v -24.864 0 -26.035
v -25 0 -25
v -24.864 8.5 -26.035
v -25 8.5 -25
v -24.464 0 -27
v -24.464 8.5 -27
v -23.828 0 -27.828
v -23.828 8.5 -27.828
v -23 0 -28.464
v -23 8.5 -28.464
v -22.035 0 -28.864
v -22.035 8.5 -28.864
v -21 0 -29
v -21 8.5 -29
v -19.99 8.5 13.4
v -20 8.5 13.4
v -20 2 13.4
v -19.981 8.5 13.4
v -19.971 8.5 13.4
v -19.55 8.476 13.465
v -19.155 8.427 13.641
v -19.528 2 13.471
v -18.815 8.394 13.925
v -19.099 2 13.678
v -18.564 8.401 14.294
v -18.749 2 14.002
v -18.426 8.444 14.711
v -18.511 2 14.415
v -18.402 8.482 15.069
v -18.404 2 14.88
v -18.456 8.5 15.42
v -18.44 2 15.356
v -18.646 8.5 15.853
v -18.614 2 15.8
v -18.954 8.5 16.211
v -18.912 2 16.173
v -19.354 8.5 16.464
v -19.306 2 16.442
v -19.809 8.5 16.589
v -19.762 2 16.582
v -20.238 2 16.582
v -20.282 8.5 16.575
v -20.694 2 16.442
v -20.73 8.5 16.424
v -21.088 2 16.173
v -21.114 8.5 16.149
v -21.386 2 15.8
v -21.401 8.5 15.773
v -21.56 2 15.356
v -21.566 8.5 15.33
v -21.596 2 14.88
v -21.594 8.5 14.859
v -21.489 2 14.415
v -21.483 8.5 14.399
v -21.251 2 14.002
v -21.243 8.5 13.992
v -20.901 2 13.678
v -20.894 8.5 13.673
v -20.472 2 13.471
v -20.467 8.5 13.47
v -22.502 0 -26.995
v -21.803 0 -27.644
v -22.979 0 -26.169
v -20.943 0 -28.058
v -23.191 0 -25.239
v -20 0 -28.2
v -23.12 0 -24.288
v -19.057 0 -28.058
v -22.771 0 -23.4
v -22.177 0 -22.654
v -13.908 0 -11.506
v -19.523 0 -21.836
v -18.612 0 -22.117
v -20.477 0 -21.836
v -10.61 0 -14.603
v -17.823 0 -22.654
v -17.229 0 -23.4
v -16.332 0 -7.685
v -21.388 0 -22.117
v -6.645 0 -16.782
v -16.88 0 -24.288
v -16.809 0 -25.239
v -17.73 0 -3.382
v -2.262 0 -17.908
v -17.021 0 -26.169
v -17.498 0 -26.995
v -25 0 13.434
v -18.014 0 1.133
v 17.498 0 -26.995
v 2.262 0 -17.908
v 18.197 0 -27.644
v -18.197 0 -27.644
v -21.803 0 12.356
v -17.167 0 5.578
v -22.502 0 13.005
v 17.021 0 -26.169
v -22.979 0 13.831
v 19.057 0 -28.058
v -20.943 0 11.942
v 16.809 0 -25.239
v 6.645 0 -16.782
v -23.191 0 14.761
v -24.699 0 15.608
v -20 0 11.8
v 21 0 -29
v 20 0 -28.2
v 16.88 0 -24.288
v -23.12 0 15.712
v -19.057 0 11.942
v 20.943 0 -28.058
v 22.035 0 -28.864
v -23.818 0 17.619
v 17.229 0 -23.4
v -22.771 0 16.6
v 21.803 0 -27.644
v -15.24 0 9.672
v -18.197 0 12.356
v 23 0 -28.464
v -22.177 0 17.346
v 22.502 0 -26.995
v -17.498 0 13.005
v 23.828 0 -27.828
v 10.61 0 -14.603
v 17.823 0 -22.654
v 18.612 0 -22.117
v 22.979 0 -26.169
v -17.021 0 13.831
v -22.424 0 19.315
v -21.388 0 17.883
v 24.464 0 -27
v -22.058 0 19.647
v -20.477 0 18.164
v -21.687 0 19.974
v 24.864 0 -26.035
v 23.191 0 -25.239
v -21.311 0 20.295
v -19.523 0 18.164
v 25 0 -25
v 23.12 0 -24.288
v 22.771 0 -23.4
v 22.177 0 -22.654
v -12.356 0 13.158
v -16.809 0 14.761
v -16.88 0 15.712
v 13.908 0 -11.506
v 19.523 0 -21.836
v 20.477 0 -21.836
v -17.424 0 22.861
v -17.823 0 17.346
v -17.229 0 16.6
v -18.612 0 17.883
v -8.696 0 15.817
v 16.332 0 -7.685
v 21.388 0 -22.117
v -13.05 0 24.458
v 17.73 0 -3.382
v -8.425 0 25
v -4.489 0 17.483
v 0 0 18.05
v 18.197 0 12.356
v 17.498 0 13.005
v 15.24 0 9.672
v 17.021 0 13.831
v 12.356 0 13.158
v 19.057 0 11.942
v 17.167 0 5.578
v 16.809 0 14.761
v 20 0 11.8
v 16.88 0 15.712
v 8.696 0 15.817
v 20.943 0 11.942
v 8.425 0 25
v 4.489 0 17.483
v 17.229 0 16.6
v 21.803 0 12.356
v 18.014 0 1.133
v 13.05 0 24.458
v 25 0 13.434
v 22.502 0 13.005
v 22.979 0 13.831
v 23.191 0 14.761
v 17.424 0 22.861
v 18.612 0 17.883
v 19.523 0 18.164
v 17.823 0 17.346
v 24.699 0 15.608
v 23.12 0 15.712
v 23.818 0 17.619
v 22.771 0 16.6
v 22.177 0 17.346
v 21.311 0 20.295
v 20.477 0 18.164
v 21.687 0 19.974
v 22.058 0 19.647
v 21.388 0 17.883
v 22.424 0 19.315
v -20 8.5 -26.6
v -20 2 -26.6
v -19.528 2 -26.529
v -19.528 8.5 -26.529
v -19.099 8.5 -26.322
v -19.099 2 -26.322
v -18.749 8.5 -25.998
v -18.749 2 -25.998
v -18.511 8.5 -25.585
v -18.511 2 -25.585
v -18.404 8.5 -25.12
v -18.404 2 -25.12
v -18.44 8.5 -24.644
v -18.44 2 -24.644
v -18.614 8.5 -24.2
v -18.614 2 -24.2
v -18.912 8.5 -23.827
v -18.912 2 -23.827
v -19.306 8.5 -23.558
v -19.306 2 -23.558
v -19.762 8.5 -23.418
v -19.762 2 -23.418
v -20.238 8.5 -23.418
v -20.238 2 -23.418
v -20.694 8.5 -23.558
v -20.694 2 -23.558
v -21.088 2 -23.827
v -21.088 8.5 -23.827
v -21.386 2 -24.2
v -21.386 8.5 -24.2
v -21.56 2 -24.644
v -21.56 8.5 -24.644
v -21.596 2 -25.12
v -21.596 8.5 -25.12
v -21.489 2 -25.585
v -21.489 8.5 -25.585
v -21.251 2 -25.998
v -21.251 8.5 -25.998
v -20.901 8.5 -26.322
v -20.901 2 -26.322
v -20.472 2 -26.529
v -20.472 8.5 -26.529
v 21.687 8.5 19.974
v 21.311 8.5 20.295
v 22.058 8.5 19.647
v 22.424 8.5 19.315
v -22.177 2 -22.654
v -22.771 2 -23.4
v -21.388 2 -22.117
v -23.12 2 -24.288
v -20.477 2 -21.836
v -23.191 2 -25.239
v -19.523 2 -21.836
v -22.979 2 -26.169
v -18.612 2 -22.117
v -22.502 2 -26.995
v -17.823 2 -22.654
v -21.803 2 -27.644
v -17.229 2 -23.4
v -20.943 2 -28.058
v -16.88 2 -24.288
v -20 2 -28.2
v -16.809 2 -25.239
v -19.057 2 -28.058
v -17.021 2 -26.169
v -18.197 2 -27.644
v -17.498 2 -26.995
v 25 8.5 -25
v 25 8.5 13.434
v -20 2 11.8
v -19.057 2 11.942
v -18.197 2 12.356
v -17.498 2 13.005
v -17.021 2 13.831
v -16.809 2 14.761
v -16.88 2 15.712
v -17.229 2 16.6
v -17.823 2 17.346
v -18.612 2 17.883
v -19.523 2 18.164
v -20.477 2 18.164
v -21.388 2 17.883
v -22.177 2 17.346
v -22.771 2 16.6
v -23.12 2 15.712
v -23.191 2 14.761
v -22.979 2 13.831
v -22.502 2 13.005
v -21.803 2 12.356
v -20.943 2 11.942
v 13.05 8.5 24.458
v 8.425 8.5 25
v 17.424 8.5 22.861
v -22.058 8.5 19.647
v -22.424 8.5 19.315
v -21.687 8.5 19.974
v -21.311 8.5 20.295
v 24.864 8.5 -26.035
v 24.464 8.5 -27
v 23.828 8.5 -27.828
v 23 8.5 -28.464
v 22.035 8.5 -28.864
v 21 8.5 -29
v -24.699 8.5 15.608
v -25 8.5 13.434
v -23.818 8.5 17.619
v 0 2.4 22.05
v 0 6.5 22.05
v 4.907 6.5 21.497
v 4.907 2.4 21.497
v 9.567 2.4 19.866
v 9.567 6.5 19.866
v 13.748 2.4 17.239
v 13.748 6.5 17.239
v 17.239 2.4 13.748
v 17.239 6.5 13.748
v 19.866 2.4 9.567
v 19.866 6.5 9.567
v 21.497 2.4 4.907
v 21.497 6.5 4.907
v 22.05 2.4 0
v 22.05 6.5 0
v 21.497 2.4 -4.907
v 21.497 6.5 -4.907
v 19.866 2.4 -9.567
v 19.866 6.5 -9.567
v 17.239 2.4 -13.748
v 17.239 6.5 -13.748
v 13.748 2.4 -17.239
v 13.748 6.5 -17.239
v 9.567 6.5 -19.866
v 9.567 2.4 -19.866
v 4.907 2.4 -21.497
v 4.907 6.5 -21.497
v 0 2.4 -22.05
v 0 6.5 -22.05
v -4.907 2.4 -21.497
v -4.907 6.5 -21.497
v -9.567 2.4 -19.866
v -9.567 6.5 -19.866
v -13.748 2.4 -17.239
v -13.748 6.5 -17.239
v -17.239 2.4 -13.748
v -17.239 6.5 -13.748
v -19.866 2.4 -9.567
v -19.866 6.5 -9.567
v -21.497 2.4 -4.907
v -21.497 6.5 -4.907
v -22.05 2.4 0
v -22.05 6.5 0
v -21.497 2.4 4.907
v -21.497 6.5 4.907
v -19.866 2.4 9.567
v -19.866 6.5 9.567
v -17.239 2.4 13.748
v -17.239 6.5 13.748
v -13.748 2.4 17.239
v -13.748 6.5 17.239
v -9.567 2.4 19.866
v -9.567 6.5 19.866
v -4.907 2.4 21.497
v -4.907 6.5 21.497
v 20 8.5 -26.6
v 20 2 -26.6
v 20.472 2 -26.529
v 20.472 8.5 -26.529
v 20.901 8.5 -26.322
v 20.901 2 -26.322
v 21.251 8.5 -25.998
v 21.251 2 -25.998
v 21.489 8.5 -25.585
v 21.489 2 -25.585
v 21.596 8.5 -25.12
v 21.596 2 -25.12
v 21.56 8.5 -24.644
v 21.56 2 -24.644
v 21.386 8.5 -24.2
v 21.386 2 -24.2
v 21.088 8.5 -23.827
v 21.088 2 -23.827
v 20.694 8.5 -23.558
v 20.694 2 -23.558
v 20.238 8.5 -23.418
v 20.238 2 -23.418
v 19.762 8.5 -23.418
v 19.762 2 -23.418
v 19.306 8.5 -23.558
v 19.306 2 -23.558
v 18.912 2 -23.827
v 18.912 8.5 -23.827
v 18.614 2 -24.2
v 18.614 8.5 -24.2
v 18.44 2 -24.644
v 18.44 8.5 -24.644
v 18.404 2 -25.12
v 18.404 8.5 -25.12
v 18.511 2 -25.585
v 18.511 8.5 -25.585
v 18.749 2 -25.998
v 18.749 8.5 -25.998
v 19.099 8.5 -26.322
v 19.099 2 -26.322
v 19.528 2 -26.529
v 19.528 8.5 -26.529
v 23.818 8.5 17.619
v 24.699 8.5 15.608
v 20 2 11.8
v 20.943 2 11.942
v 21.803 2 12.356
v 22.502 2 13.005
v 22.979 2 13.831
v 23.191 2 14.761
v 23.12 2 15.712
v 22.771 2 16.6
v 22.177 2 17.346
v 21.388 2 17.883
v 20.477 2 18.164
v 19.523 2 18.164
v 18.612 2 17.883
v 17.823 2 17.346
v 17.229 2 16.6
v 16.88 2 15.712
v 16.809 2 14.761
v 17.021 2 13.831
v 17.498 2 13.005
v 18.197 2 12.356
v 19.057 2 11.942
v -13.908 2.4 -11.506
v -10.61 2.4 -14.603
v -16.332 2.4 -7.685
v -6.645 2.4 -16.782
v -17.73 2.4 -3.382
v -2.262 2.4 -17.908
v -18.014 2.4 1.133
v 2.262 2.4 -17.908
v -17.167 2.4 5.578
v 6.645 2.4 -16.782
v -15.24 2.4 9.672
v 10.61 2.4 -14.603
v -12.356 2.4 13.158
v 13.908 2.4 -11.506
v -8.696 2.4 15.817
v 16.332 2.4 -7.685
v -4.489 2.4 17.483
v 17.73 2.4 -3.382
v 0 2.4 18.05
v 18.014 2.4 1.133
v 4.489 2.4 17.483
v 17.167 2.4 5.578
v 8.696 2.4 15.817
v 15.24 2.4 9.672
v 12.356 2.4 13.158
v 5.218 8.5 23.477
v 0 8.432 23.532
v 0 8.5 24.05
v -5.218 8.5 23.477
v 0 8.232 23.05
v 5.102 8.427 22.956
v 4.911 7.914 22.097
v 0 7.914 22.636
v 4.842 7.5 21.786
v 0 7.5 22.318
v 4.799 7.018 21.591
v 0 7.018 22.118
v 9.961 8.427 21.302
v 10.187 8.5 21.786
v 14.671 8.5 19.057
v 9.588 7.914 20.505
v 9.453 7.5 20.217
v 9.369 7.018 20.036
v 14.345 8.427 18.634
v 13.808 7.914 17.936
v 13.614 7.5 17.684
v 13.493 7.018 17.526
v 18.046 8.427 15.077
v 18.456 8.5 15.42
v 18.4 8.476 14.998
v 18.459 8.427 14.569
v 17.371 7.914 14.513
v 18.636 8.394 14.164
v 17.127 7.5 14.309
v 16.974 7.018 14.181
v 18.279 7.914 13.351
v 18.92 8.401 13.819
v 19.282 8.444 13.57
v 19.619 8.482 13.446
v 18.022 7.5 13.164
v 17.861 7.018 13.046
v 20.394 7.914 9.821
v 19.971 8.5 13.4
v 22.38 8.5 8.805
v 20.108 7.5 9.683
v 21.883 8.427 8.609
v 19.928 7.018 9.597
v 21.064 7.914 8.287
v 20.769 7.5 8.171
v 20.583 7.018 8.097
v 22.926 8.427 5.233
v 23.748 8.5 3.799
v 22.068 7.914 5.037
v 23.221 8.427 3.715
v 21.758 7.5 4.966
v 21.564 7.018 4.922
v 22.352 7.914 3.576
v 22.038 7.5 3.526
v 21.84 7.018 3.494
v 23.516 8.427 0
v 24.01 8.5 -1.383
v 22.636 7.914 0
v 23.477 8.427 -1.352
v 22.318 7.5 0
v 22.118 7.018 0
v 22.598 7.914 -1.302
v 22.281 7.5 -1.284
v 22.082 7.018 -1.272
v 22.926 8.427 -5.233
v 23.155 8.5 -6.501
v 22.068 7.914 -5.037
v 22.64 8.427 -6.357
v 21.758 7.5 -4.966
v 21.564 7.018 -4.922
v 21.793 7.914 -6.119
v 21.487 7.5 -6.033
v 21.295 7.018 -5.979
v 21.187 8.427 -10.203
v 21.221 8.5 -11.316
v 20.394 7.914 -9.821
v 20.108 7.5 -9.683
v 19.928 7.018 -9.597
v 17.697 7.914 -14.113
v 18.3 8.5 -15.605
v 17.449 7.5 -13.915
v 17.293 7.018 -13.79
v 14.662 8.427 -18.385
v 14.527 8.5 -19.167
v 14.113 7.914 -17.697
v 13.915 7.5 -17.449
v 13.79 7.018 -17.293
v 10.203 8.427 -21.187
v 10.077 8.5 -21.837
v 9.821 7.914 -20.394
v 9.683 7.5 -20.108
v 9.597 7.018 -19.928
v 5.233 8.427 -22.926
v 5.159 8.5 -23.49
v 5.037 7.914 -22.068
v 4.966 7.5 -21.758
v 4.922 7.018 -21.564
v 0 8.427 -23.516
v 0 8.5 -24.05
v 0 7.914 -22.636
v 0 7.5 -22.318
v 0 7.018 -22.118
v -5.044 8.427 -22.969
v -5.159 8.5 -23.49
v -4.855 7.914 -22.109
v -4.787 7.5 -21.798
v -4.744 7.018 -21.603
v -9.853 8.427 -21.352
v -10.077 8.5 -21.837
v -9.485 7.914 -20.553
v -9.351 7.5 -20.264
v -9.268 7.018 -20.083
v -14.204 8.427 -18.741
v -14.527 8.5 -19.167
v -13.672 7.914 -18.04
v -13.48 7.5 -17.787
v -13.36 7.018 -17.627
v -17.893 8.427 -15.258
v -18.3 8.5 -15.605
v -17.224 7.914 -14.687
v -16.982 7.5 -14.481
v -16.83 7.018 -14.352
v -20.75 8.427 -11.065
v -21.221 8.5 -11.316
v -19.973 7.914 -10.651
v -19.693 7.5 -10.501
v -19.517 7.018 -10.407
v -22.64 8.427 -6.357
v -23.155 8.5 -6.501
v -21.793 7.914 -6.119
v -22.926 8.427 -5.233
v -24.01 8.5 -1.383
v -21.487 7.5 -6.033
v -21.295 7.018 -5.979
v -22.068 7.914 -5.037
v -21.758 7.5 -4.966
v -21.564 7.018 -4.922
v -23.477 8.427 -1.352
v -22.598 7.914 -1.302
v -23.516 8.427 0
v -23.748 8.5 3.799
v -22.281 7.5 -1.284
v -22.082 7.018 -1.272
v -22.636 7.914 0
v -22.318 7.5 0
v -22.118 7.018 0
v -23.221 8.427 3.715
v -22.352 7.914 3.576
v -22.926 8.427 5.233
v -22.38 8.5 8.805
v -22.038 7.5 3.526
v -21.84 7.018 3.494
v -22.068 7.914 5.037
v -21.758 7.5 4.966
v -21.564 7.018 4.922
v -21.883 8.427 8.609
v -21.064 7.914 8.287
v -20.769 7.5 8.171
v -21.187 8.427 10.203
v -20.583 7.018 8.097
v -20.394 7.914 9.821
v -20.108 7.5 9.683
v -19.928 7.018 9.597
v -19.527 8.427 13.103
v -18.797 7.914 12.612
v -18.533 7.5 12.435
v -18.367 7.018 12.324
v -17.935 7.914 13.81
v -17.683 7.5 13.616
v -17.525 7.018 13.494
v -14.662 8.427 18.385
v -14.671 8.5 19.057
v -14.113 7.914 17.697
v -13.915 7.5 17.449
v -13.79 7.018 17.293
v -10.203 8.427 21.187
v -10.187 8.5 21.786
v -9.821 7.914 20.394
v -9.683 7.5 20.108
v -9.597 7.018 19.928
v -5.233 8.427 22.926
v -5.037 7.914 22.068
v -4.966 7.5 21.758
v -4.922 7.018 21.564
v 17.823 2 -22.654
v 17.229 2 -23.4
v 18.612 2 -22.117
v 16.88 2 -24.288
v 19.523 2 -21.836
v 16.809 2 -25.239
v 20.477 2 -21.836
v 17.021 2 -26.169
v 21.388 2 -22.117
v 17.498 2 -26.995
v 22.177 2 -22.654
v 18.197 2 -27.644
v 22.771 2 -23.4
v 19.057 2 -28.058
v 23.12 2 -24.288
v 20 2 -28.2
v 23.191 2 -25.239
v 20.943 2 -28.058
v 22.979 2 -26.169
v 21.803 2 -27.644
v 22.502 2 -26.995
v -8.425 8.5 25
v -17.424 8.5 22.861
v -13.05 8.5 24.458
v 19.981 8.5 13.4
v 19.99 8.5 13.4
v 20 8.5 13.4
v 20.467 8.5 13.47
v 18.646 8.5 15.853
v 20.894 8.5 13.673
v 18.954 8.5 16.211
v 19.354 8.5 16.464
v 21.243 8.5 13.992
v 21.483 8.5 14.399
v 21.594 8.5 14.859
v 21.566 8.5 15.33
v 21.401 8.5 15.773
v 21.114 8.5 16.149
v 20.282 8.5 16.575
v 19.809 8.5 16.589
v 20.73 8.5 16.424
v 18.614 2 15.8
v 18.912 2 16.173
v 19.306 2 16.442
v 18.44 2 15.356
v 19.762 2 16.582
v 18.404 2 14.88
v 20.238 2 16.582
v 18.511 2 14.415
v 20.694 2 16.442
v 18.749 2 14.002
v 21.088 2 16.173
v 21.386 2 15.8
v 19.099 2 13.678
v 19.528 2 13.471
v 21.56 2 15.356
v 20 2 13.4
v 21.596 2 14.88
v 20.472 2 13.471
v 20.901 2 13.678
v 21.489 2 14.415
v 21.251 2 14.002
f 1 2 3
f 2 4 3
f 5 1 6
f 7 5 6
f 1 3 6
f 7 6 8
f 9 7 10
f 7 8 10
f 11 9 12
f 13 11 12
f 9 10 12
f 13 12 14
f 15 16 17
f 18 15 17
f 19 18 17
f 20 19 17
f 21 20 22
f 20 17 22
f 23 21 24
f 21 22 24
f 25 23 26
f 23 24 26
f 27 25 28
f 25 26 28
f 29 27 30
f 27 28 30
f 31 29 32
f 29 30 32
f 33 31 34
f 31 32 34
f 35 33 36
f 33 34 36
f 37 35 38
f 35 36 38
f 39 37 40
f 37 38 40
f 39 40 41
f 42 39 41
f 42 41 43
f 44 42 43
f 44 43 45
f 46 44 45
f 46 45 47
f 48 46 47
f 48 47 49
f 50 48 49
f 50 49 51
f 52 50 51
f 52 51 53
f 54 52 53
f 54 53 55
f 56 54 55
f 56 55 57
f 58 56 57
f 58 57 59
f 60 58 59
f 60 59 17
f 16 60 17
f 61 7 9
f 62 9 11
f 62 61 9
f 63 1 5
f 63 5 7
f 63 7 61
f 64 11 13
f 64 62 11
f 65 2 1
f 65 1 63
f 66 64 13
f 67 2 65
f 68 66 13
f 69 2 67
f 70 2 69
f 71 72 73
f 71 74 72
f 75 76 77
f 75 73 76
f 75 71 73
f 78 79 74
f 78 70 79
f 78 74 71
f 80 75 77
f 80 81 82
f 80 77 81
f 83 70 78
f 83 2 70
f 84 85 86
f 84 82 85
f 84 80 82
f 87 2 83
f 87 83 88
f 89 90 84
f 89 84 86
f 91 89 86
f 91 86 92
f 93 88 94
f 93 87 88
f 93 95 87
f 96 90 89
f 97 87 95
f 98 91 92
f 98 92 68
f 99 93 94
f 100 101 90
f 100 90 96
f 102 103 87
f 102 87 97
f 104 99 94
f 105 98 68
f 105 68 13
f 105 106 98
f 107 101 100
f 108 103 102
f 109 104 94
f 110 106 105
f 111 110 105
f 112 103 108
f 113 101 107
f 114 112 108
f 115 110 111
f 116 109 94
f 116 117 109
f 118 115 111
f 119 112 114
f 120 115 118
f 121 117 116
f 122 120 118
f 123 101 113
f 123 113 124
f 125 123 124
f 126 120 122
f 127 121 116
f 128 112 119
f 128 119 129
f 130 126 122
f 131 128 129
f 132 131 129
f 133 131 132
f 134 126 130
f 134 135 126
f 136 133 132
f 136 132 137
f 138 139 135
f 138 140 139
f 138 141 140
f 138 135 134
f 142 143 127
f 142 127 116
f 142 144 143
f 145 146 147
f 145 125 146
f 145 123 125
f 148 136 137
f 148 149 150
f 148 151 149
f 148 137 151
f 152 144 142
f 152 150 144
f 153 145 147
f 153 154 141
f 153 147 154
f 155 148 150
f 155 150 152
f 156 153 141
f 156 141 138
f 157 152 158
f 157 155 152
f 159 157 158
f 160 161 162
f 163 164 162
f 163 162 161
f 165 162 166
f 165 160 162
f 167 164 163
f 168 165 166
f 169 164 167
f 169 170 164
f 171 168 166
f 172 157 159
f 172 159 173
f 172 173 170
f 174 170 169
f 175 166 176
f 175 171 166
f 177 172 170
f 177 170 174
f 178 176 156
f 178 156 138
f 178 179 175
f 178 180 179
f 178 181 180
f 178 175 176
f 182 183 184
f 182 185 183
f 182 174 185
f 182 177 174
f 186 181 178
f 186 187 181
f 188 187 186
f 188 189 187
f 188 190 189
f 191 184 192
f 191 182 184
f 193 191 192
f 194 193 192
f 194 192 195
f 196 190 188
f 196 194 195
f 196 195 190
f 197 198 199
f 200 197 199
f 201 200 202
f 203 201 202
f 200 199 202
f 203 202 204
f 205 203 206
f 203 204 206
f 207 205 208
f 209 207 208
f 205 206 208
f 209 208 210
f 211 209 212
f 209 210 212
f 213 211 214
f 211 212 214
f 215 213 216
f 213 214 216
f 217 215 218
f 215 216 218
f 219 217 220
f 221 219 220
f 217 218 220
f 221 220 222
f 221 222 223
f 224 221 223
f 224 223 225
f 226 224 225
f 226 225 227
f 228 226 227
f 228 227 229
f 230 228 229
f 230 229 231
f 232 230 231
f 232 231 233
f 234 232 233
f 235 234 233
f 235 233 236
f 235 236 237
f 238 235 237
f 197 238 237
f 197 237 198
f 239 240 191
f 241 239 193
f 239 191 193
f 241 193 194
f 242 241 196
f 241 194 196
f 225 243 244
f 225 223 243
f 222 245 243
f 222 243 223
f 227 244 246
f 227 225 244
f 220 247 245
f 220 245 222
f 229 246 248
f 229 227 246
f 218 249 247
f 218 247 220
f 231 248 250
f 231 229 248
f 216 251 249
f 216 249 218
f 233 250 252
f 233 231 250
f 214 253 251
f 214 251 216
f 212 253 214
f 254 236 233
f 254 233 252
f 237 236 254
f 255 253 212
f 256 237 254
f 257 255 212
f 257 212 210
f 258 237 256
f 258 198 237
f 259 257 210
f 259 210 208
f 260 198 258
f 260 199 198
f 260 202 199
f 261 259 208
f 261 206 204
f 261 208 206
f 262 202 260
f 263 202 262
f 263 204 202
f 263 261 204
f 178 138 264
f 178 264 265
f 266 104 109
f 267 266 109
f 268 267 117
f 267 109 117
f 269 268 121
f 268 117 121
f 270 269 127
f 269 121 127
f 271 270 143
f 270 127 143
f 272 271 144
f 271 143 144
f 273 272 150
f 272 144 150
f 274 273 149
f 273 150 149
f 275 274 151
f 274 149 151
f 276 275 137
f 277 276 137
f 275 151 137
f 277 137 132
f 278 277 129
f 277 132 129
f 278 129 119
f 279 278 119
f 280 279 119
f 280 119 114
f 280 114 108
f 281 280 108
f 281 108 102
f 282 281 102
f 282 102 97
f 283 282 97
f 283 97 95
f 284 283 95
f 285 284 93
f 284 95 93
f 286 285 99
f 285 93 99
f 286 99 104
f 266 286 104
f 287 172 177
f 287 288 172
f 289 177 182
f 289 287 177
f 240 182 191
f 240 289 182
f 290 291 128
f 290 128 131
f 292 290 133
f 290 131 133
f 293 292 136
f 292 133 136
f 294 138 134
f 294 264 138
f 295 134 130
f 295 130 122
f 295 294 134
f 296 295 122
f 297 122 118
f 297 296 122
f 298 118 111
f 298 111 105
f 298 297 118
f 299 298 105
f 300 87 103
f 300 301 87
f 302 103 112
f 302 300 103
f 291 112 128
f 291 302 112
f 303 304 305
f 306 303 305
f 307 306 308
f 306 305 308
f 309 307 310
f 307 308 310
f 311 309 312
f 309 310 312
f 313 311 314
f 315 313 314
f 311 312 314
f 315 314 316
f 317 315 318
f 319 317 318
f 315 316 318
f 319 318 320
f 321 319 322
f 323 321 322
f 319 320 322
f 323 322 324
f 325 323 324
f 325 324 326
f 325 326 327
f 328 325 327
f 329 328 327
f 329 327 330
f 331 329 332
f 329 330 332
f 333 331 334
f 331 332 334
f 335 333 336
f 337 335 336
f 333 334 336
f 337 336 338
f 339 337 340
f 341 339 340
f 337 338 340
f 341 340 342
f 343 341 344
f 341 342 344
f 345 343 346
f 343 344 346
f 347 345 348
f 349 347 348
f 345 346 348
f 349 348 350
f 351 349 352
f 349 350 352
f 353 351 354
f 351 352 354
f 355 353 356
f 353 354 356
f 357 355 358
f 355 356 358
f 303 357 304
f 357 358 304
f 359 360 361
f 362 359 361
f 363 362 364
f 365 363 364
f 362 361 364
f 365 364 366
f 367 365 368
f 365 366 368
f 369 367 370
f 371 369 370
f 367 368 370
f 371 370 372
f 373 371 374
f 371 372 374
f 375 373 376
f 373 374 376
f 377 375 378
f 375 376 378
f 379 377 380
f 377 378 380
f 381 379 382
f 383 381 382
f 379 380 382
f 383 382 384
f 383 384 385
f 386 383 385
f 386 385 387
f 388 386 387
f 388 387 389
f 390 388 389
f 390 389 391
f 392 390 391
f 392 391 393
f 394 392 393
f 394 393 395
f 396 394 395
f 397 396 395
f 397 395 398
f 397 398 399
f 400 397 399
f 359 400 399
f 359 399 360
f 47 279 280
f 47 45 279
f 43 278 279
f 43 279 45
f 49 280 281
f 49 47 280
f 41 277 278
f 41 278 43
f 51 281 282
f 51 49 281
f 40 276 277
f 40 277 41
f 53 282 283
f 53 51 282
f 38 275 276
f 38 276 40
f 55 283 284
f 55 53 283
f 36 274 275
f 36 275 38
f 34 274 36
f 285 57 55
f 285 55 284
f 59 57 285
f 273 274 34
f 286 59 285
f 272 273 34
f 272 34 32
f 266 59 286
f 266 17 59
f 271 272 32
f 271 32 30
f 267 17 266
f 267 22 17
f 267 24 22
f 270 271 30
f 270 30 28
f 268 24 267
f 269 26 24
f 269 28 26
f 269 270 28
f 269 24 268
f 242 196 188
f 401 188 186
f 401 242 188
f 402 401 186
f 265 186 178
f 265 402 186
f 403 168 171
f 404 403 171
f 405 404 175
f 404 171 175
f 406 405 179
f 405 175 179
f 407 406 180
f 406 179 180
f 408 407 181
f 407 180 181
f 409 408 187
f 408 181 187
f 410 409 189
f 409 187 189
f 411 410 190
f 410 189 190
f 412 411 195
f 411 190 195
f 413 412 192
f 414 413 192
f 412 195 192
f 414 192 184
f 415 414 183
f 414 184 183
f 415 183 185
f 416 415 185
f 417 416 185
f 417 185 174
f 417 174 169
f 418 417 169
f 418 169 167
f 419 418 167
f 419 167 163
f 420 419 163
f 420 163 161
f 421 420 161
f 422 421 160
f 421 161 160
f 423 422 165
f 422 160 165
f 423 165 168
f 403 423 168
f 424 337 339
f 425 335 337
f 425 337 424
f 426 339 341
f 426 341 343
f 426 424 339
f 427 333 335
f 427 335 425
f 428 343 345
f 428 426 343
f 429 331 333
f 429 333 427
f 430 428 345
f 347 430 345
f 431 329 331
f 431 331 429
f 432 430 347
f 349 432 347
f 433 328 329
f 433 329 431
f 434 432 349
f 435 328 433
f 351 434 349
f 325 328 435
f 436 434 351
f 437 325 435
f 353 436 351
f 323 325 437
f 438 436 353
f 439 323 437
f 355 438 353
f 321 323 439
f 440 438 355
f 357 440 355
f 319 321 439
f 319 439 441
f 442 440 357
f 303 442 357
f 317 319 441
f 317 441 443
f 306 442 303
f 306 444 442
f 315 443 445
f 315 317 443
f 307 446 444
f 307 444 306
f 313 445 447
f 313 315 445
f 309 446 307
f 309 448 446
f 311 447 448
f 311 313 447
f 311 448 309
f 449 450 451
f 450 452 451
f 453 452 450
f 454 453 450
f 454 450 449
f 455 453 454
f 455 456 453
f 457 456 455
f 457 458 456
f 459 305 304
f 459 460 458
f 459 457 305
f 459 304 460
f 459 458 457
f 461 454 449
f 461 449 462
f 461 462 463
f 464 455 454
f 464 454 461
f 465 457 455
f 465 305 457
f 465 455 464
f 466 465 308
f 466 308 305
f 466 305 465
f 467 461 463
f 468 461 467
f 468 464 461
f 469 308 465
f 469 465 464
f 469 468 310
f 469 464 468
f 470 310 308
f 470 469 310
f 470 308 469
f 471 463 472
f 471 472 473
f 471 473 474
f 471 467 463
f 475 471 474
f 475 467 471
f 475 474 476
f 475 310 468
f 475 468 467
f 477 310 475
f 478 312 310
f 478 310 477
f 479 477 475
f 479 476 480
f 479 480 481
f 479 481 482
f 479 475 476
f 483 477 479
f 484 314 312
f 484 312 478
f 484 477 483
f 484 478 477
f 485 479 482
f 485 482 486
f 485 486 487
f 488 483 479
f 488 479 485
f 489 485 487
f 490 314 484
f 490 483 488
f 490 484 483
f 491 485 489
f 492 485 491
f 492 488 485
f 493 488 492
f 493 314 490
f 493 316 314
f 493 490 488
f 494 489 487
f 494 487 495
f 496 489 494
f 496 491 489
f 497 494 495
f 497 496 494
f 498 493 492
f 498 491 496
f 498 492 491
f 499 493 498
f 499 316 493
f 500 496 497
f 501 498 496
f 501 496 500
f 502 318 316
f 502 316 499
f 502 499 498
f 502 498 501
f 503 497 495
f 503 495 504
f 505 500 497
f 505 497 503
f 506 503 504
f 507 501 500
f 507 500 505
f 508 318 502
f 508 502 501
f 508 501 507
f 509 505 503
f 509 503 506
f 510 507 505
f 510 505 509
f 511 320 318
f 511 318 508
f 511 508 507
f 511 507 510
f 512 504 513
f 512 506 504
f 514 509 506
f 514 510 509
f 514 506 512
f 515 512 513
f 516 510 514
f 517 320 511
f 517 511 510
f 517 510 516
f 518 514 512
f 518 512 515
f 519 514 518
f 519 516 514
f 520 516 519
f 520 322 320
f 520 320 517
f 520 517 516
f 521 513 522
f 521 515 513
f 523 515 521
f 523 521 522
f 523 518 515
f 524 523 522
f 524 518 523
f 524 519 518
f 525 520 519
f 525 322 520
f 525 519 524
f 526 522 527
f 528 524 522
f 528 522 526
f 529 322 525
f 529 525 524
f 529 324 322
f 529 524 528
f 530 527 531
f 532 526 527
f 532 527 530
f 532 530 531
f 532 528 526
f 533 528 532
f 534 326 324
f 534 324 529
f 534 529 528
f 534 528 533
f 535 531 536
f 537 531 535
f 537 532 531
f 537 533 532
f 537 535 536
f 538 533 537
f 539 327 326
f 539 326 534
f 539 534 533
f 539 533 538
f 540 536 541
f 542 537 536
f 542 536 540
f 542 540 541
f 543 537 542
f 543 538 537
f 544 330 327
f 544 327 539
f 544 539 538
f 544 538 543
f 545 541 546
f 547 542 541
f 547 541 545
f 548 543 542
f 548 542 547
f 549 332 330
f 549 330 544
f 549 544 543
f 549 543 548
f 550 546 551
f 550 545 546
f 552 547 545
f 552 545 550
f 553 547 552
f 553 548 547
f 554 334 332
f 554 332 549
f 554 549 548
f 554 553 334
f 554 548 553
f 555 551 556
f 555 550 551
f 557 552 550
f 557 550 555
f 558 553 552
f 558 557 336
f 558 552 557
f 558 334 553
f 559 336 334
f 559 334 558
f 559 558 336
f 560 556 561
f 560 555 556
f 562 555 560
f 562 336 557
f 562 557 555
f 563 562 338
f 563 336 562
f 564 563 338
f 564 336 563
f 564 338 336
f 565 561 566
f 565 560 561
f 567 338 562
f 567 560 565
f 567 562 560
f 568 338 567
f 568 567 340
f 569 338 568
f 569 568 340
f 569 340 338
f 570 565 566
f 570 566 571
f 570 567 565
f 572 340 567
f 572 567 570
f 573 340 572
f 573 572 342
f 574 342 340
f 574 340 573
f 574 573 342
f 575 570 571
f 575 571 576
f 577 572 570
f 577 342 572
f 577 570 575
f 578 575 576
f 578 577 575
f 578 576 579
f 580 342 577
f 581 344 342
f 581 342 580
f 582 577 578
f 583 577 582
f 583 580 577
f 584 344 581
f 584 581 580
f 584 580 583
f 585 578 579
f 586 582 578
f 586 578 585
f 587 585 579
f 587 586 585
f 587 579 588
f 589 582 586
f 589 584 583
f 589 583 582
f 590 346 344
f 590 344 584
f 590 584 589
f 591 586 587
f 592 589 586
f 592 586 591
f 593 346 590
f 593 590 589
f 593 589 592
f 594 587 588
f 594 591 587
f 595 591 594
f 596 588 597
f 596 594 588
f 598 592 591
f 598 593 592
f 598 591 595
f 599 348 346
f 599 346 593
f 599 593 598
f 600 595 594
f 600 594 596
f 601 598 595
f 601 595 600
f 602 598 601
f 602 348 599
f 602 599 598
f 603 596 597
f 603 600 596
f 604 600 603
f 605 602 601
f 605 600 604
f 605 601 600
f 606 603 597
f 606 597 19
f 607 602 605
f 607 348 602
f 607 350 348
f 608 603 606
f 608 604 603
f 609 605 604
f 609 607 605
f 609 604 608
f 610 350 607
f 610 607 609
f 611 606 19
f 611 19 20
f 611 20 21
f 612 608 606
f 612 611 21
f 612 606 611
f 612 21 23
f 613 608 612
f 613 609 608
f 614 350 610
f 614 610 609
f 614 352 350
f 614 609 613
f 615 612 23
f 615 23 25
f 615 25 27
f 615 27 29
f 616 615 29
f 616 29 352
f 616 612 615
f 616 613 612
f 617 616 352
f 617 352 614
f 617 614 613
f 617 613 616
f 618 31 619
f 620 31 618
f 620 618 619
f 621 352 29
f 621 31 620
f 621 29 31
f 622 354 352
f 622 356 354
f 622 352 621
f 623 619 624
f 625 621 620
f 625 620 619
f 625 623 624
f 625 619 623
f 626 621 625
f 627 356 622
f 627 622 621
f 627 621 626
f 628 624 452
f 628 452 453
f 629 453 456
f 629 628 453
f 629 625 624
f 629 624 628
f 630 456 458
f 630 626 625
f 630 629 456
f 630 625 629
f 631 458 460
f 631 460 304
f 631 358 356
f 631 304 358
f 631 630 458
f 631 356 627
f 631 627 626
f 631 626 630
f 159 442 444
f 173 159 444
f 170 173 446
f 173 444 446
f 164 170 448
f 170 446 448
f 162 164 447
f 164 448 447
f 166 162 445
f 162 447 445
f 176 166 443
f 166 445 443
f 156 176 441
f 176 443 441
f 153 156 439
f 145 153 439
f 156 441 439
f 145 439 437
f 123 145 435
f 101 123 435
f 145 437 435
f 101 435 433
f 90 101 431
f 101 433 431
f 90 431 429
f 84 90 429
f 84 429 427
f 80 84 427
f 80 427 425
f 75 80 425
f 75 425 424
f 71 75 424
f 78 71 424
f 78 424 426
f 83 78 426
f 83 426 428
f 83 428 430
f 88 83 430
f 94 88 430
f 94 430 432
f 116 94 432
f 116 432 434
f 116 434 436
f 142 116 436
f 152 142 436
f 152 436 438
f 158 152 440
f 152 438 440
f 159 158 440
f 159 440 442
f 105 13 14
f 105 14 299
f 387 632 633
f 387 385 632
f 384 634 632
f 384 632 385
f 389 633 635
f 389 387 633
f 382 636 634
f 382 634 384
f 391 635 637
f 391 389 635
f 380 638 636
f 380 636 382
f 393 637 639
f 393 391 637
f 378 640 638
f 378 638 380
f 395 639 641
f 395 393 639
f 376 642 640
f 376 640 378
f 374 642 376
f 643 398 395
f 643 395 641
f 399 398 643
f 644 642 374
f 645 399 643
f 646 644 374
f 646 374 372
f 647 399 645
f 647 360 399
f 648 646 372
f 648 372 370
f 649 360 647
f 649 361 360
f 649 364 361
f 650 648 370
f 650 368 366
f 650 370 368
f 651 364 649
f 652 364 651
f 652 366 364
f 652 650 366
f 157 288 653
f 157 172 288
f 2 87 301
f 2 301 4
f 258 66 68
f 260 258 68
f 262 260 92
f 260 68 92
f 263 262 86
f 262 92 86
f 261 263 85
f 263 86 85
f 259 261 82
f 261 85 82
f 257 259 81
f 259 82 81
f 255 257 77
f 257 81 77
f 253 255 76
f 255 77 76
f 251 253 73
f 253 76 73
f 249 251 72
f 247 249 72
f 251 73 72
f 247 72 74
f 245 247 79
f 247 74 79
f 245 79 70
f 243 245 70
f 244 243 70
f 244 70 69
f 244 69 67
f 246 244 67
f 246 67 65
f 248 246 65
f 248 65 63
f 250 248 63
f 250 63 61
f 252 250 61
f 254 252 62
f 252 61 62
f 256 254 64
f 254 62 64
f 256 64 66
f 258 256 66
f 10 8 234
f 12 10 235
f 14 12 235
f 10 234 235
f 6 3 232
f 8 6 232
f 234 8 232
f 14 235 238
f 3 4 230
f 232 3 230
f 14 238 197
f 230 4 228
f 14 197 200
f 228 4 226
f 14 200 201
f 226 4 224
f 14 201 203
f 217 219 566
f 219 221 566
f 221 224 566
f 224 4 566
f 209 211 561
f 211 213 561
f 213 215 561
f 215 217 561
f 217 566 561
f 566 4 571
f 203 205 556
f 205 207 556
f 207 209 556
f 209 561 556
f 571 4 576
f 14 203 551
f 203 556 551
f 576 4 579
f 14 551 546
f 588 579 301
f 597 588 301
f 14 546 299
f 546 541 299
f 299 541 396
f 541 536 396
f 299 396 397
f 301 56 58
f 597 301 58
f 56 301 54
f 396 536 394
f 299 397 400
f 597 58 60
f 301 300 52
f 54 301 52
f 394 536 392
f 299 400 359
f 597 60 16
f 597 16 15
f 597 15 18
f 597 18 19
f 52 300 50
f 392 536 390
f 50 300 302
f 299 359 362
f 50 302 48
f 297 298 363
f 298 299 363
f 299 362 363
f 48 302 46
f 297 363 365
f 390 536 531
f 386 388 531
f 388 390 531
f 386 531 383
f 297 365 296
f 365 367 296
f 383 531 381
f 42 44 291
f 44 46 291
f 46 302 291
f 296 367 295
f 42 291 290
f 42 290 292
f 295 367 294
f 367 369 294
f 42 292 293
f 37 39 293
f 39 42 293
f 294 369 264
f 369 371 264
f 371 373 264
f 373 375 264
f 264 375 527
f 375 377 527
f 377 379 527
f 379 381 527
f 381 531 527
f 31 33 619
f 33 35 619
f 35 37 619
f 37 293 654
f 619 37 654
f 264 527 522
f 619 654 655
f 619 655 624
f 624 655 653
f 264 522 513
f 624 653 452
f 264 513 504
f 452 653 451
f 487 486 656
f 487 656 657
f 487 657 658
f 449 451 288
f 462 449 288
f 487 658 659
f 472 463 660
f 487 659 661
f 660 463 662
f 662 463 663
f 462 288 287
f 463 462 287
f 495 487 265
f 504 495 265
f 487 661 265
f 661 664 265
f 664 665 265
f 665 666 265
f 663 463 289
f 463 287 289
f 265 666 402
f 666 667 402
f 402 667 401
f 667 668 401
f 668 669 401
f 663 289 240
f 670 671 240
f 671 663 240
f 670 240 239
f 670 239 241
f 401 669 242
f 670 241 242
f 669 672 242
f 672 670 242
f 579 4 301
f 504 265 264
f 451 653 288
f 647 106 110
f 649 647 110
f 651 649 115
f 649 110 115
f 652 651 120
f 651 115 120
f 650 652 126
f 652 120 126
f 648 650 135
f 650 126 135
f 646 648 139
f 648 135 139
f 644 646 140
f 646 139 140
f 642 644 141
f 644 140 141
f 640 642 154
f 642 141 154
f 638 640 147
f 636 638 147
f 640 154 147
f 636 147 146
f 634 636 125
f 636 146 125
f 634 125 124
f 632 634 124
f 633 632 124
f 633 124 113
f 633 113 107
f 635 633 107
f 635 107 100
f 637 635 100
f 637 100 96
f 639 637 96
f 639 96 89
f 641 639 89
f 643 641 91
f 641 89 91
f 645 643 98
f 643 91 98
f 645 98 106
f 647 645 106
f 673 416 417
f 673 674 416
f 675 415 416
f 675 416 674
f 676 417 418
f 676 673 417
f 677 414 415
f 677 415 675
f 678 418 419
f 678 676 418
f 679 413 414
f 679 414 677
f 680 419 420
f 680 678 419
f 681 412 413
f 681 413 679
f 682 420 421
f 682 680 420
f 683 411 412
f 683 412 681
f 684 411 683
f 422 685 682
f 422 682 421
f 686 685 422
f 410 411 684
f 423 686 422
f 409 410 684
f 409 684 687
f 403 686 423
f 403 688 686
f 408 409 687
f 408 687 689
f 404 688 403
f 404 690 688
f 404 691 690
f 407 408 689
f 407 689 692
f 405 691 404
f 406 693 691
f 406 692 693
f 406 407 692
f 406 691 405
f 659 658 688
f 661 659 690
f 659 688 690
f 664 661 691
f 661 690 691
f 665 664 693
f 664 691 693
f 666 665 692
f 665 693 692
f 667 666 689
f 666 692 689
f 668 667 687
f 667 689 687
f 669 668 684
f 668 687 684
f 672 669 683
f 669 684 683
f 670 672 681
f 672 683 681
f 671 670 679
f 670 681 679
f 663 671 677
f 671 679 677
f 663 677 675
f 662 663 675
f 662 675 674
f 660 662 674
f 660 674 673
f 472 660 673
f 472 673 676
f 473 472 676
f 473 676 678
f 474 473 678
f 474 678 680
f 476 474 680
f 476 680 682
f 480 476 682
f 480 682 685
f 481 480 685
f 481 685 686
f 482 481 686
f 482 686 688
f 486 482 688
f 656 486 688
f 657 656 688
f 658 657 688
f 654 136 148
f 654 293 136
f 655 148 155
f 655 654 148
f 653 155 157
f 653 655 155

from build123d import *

# Parameters (mm, degrees)
SKETCH_1_R          = 25
EXTRUDE_1_DEPTH     = 8.5
SKETCH_2_R          = 22.05
CUT_EXTRUDE_1_DEPTH = 6.1
SKETCH_3_R          = 18.05
CUT_EXTRUDE_2_DEPTH = 12.5
FILLET_2_R          = 2
EXTRUDE_3_DEPTH     = 8.5
SKETCH_8_R          = 3.2
SKETCH_8_R_2        = 1.6
CUT_EXTRUDE_3_DEPTH = 2
SKETCH_8_2_R        = 1.6
CUT_EXTRUDE_4_DEPTH = 10
FILLET_3_R          = 4
CUT_EXTRUDE_5_DEPTH = 10
FILLET_5_R          = 8
FILLET_6_R          = 20


with BuildPart() as part:
    # 草图1 → 凸台-拉伸1 (new body)
    with BuildSketch(Plane(origin=(0, 0, 0), x_dir=(1, 0, 0), z_dir=(0, 1, 0))):
        Circle(SKETCH_1_R)
    extrude(amount=EXTRUDE_1_DEPTH)

    # 草图2 → 切除-拉伸1 (cut)
    with BuildSketch(Plane(origin=(0, 8.5, 0), x_dir=(1, 0, 0), z_dir=(0, 1, 0))):
        Circle(SKETCH_2_R)
    extrude(amount=-CUT_EXTRUDE_1_DEPTH, mode=Mode.SUBTRACT)

    # 草图3 → 切除-拉伸2 (cut)
    with BuildSketch(Plane(origin=(0, 2.4, 0), x_dir=(1, 0, 0), z_dir=(0, 1, 0))):
        Circle(SKETCH_3_R)
    extrude(amount=-CUT_EXTRUDE_2_DEPTH, mode=Mode.SUBTRACT)

    # 圆角2
    fillet_2_edges = [part.edges().sort_by_distance(p)[0] for p in [
        (-22.05, 8.5, 0),
    ]]
    fillet(fillet_2_edges, radius=FILLET_2_R)

    # 草图7 → 凸台-拉伸3 (add)
    with BuildSketch(Plane.XZ):
        with BuildLine():
            ThreePointArc((-25, -4.2e-08), (-17.677669545, 17.677669515), (0, 25))
            Line((0, 25), (-25, 25))
            Line((-25, 25), (-25, -4.2e-08))
        make_face()
        with BuildLine():
            Line((25, 25), (0, 25))
            ThreePointArc((0, 25), (17.67766953, 17.67766953), (25, 0))
            Line((25, 0), (25, 25))
        make_face()
        with BuildLine():
            ThreePointArc((25, 0), (2.1e-08, -25), (-25, -4.2e-08))
            Line((-25, -4.2e-08), (-25, -29))
            Line((-25, -29), (25, -29))
            Line((25, -29), (25, 0))
        make_face()
    extrude(amount=-EXTRUDE_3_DEPTH)

    # 草图8 → 切除-拉伸3 (cut)
    # profile 1 of 4: a face of its own
    with BuildSketch(Plane.XZ):
        with Locations((-20, 15)):
            Circle(SKETCH_8_R)
        with Locations((-20, 15)):
            Circle(SKETCH_8_R_2, mode=Mode.SUBTRACT)
    # profile 2 of 4: a face of its own
    with BuildSketch(Plane.XZ):
        with Locations((20, 15)):
            Circle(SKETCH_8_R)
        with Locations((20, 15)):
            Circle(SKETCH_8_R_2, mode=Mode.SUBTRACT)
    # profile 3 of 4: a face of its own
    with BuildSketch(Plane.XZ):
        with Locations((20, -25)):
            Circle(SKETCH_8_R)
        with Locations((20, -25)):
            Circle(SKETCH_8_R_2, mode=Mode.SUBTRACT)
    # profile 4 of 4: a face of its own
    with BuildSketch(Plane.XZ):
        with Locations((-20, -25)):
            Circle(SKETCH_8_R)
        with Locations((-20, -25)):
            Circle(SKETCH_8_R_2, mode=Mode.SUBTRACT)
    extrude(amount=-CUT_EXTRUDE_3_DEPTH, mode=Mode.SUBTRACT)

    # 草图8<2> → 切除-拉伸4 (cut)
    with BuildSketch(Plane.XZ):
        with Locations((-20, 15)):
            Circle(SKETCH_8_2_R)
        with Locations((20, 15)):
            Circle(SKETCH_8_2_R)
        with Locations((20, -25)):
            Circle(SKETCH_8_2_R)
        with Locations((-20, -25)):
            Circle(SKETCH_8_2_R)
    extrude(amount=-CUT_EXTRUDE_4_DEPTH, mode=Mode.SUBTRACT)

    # 圆角3
    fillet_3_edges = [part.edges().sort_by_distance(p)[0] for p in [
        (25, 4.25, -29),
        (-25, 4.25, -29),
    ]]
    fillet(fillet_3_edges, radius=FILLET_3_R)

    # 草图9 → 切除-拉伸5 (cut)
    with BuildSketch(Plane.XZ):
        with BuildLine():
            Line((25, 25), (13.928848582, 25))
            ThreePointArc((13.928848582, 25), (19.906442689, 21.414889027), (25, 16.656703877))
            Line((25, 16.656703877), (25, 25))
        make_face()
        with BuildLine():
            Line((-25, 25), (-25, 16.656703877))
            ThreePointArc((-25, 16.656703877), (-19.906442689, 21.414889027), (-13.928848582, 25))
            Line((-13.928848582, 25), (-25, 25))
        make_face()
    extrude(amount=-CUT_EXTRUDE_5_DEPTH, mode=Mode.SUBTRACT)

    # 圆角5
    fillet_5_edges = [part.edges().sort_by_distance(p)[0] for p in [
        (25, 4.25, 16.656703877),
        (-25, 4.25, 16.656703877),
    ]]
    fillet(fillet_5_edges, radius=FILLET_5_R)

    # 圆角6
    fillet_6_edges = [part.edges().sort_by_distance(p)[0] for p in [
        (13.928848582, 4.25, 25),
        (-13.928848582, 4.25, 25),
    ]]
    fillet(fillet_6_edges, radius=FILLET_6_R)


solid = part.part
